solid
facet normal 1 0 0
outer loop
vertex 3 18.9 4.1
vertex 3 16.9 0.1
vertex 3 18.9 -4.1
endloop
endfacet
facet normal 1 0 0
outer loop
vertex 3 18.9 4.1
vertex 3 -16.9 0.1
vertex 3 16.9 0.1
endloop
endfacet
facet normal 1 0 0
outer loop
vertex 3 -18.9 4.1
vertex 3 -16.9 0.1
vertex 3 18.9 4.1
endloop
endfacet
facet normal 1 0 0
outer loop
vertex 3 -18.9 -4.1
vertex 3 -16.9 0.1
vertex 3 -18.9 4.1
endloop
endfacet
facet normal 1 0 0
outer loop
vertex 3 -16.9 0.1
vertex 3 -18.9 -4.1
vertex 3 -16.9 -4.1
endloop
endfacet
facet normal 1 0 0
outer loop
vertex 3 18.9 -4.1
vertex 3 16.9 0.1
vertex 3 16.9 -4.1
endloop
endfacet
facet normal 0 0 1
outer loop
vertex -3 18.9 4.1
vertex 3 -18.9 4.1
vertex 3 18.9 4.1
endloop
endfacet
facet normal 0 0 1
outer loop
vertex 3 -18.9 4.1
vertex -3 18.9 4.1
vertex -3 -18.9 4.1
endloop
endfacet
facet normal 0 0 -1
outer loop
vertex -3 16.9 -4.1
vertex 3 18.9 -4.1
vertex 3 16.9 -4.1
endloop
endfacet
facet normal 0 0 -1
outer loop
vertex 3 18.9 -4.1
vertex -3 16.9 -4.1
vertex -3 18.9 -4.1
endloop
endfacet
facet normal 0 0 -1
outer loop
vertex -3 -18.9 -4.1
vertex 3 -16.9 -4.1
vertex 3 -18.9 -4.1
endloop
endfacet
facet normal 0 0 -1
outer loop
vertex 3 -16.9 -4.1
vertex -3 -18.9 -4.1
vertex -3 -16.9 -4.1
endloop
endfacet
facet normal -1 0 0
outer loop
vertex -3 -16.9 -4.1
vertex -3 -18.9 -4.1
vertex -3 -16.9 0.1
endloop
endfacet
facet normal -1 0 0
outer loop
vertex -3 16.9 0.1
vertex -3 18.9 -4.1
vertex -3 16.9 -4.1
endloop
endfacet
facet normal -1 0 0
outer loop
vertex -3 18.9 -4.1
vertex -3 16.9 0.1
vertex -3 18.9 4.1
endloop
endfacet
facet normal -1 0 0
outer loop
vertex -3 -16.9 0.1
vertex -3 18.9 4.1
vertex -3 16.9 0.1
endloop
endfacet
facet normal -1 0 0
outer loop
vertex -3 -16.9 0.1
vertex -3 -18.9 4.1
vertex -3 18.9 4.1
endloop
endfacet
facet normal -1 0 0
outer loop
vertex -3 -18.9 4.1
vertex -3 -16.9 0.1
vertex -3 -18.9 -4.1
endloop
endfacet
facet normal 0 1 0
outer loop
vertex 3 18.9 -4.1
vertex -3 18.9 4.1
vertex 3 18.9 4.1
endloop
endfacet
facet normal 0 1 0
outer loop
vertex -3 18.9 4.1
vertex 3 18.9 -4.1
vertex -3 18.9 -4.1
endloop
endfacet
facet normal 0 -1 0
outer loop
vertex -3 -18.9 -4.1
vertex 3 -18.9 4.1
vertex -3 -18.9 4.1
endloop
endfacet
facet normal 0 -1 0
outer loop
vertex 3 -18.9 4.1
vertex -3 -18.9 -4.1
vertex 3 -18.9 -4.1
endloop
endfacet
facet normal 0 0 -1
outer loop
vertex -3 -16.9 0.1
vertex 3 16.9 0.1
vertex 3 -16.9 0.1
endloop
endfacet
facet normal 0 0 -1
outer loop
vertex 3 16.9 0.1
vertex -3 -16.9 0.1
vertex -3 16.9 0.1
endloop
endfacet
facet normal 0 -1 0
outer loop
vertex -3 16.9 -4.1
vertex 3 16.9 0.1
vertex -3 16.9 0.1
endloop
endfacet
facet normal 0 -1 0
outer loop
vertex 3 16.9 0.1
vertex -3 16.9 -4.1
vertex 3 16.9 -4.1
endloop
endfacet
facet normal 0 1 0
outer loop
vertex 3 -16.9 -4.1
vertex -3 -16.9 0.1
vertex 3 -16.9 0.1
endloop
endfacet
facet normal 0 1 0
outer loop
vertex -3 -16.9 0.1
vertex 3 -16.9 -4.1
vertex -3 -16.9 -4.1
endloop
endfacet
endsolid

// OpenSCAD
difference() {
	translate(v = [0, 0, 0]) {
		cube(center = true, size = [6, 37.8000000000, 8.2000000000]);
	}
	translate(v = [0, 0, -2]) {
		cube(center = true, size = [10, 33.8000000000, 4.2000000000]);
	}
}
